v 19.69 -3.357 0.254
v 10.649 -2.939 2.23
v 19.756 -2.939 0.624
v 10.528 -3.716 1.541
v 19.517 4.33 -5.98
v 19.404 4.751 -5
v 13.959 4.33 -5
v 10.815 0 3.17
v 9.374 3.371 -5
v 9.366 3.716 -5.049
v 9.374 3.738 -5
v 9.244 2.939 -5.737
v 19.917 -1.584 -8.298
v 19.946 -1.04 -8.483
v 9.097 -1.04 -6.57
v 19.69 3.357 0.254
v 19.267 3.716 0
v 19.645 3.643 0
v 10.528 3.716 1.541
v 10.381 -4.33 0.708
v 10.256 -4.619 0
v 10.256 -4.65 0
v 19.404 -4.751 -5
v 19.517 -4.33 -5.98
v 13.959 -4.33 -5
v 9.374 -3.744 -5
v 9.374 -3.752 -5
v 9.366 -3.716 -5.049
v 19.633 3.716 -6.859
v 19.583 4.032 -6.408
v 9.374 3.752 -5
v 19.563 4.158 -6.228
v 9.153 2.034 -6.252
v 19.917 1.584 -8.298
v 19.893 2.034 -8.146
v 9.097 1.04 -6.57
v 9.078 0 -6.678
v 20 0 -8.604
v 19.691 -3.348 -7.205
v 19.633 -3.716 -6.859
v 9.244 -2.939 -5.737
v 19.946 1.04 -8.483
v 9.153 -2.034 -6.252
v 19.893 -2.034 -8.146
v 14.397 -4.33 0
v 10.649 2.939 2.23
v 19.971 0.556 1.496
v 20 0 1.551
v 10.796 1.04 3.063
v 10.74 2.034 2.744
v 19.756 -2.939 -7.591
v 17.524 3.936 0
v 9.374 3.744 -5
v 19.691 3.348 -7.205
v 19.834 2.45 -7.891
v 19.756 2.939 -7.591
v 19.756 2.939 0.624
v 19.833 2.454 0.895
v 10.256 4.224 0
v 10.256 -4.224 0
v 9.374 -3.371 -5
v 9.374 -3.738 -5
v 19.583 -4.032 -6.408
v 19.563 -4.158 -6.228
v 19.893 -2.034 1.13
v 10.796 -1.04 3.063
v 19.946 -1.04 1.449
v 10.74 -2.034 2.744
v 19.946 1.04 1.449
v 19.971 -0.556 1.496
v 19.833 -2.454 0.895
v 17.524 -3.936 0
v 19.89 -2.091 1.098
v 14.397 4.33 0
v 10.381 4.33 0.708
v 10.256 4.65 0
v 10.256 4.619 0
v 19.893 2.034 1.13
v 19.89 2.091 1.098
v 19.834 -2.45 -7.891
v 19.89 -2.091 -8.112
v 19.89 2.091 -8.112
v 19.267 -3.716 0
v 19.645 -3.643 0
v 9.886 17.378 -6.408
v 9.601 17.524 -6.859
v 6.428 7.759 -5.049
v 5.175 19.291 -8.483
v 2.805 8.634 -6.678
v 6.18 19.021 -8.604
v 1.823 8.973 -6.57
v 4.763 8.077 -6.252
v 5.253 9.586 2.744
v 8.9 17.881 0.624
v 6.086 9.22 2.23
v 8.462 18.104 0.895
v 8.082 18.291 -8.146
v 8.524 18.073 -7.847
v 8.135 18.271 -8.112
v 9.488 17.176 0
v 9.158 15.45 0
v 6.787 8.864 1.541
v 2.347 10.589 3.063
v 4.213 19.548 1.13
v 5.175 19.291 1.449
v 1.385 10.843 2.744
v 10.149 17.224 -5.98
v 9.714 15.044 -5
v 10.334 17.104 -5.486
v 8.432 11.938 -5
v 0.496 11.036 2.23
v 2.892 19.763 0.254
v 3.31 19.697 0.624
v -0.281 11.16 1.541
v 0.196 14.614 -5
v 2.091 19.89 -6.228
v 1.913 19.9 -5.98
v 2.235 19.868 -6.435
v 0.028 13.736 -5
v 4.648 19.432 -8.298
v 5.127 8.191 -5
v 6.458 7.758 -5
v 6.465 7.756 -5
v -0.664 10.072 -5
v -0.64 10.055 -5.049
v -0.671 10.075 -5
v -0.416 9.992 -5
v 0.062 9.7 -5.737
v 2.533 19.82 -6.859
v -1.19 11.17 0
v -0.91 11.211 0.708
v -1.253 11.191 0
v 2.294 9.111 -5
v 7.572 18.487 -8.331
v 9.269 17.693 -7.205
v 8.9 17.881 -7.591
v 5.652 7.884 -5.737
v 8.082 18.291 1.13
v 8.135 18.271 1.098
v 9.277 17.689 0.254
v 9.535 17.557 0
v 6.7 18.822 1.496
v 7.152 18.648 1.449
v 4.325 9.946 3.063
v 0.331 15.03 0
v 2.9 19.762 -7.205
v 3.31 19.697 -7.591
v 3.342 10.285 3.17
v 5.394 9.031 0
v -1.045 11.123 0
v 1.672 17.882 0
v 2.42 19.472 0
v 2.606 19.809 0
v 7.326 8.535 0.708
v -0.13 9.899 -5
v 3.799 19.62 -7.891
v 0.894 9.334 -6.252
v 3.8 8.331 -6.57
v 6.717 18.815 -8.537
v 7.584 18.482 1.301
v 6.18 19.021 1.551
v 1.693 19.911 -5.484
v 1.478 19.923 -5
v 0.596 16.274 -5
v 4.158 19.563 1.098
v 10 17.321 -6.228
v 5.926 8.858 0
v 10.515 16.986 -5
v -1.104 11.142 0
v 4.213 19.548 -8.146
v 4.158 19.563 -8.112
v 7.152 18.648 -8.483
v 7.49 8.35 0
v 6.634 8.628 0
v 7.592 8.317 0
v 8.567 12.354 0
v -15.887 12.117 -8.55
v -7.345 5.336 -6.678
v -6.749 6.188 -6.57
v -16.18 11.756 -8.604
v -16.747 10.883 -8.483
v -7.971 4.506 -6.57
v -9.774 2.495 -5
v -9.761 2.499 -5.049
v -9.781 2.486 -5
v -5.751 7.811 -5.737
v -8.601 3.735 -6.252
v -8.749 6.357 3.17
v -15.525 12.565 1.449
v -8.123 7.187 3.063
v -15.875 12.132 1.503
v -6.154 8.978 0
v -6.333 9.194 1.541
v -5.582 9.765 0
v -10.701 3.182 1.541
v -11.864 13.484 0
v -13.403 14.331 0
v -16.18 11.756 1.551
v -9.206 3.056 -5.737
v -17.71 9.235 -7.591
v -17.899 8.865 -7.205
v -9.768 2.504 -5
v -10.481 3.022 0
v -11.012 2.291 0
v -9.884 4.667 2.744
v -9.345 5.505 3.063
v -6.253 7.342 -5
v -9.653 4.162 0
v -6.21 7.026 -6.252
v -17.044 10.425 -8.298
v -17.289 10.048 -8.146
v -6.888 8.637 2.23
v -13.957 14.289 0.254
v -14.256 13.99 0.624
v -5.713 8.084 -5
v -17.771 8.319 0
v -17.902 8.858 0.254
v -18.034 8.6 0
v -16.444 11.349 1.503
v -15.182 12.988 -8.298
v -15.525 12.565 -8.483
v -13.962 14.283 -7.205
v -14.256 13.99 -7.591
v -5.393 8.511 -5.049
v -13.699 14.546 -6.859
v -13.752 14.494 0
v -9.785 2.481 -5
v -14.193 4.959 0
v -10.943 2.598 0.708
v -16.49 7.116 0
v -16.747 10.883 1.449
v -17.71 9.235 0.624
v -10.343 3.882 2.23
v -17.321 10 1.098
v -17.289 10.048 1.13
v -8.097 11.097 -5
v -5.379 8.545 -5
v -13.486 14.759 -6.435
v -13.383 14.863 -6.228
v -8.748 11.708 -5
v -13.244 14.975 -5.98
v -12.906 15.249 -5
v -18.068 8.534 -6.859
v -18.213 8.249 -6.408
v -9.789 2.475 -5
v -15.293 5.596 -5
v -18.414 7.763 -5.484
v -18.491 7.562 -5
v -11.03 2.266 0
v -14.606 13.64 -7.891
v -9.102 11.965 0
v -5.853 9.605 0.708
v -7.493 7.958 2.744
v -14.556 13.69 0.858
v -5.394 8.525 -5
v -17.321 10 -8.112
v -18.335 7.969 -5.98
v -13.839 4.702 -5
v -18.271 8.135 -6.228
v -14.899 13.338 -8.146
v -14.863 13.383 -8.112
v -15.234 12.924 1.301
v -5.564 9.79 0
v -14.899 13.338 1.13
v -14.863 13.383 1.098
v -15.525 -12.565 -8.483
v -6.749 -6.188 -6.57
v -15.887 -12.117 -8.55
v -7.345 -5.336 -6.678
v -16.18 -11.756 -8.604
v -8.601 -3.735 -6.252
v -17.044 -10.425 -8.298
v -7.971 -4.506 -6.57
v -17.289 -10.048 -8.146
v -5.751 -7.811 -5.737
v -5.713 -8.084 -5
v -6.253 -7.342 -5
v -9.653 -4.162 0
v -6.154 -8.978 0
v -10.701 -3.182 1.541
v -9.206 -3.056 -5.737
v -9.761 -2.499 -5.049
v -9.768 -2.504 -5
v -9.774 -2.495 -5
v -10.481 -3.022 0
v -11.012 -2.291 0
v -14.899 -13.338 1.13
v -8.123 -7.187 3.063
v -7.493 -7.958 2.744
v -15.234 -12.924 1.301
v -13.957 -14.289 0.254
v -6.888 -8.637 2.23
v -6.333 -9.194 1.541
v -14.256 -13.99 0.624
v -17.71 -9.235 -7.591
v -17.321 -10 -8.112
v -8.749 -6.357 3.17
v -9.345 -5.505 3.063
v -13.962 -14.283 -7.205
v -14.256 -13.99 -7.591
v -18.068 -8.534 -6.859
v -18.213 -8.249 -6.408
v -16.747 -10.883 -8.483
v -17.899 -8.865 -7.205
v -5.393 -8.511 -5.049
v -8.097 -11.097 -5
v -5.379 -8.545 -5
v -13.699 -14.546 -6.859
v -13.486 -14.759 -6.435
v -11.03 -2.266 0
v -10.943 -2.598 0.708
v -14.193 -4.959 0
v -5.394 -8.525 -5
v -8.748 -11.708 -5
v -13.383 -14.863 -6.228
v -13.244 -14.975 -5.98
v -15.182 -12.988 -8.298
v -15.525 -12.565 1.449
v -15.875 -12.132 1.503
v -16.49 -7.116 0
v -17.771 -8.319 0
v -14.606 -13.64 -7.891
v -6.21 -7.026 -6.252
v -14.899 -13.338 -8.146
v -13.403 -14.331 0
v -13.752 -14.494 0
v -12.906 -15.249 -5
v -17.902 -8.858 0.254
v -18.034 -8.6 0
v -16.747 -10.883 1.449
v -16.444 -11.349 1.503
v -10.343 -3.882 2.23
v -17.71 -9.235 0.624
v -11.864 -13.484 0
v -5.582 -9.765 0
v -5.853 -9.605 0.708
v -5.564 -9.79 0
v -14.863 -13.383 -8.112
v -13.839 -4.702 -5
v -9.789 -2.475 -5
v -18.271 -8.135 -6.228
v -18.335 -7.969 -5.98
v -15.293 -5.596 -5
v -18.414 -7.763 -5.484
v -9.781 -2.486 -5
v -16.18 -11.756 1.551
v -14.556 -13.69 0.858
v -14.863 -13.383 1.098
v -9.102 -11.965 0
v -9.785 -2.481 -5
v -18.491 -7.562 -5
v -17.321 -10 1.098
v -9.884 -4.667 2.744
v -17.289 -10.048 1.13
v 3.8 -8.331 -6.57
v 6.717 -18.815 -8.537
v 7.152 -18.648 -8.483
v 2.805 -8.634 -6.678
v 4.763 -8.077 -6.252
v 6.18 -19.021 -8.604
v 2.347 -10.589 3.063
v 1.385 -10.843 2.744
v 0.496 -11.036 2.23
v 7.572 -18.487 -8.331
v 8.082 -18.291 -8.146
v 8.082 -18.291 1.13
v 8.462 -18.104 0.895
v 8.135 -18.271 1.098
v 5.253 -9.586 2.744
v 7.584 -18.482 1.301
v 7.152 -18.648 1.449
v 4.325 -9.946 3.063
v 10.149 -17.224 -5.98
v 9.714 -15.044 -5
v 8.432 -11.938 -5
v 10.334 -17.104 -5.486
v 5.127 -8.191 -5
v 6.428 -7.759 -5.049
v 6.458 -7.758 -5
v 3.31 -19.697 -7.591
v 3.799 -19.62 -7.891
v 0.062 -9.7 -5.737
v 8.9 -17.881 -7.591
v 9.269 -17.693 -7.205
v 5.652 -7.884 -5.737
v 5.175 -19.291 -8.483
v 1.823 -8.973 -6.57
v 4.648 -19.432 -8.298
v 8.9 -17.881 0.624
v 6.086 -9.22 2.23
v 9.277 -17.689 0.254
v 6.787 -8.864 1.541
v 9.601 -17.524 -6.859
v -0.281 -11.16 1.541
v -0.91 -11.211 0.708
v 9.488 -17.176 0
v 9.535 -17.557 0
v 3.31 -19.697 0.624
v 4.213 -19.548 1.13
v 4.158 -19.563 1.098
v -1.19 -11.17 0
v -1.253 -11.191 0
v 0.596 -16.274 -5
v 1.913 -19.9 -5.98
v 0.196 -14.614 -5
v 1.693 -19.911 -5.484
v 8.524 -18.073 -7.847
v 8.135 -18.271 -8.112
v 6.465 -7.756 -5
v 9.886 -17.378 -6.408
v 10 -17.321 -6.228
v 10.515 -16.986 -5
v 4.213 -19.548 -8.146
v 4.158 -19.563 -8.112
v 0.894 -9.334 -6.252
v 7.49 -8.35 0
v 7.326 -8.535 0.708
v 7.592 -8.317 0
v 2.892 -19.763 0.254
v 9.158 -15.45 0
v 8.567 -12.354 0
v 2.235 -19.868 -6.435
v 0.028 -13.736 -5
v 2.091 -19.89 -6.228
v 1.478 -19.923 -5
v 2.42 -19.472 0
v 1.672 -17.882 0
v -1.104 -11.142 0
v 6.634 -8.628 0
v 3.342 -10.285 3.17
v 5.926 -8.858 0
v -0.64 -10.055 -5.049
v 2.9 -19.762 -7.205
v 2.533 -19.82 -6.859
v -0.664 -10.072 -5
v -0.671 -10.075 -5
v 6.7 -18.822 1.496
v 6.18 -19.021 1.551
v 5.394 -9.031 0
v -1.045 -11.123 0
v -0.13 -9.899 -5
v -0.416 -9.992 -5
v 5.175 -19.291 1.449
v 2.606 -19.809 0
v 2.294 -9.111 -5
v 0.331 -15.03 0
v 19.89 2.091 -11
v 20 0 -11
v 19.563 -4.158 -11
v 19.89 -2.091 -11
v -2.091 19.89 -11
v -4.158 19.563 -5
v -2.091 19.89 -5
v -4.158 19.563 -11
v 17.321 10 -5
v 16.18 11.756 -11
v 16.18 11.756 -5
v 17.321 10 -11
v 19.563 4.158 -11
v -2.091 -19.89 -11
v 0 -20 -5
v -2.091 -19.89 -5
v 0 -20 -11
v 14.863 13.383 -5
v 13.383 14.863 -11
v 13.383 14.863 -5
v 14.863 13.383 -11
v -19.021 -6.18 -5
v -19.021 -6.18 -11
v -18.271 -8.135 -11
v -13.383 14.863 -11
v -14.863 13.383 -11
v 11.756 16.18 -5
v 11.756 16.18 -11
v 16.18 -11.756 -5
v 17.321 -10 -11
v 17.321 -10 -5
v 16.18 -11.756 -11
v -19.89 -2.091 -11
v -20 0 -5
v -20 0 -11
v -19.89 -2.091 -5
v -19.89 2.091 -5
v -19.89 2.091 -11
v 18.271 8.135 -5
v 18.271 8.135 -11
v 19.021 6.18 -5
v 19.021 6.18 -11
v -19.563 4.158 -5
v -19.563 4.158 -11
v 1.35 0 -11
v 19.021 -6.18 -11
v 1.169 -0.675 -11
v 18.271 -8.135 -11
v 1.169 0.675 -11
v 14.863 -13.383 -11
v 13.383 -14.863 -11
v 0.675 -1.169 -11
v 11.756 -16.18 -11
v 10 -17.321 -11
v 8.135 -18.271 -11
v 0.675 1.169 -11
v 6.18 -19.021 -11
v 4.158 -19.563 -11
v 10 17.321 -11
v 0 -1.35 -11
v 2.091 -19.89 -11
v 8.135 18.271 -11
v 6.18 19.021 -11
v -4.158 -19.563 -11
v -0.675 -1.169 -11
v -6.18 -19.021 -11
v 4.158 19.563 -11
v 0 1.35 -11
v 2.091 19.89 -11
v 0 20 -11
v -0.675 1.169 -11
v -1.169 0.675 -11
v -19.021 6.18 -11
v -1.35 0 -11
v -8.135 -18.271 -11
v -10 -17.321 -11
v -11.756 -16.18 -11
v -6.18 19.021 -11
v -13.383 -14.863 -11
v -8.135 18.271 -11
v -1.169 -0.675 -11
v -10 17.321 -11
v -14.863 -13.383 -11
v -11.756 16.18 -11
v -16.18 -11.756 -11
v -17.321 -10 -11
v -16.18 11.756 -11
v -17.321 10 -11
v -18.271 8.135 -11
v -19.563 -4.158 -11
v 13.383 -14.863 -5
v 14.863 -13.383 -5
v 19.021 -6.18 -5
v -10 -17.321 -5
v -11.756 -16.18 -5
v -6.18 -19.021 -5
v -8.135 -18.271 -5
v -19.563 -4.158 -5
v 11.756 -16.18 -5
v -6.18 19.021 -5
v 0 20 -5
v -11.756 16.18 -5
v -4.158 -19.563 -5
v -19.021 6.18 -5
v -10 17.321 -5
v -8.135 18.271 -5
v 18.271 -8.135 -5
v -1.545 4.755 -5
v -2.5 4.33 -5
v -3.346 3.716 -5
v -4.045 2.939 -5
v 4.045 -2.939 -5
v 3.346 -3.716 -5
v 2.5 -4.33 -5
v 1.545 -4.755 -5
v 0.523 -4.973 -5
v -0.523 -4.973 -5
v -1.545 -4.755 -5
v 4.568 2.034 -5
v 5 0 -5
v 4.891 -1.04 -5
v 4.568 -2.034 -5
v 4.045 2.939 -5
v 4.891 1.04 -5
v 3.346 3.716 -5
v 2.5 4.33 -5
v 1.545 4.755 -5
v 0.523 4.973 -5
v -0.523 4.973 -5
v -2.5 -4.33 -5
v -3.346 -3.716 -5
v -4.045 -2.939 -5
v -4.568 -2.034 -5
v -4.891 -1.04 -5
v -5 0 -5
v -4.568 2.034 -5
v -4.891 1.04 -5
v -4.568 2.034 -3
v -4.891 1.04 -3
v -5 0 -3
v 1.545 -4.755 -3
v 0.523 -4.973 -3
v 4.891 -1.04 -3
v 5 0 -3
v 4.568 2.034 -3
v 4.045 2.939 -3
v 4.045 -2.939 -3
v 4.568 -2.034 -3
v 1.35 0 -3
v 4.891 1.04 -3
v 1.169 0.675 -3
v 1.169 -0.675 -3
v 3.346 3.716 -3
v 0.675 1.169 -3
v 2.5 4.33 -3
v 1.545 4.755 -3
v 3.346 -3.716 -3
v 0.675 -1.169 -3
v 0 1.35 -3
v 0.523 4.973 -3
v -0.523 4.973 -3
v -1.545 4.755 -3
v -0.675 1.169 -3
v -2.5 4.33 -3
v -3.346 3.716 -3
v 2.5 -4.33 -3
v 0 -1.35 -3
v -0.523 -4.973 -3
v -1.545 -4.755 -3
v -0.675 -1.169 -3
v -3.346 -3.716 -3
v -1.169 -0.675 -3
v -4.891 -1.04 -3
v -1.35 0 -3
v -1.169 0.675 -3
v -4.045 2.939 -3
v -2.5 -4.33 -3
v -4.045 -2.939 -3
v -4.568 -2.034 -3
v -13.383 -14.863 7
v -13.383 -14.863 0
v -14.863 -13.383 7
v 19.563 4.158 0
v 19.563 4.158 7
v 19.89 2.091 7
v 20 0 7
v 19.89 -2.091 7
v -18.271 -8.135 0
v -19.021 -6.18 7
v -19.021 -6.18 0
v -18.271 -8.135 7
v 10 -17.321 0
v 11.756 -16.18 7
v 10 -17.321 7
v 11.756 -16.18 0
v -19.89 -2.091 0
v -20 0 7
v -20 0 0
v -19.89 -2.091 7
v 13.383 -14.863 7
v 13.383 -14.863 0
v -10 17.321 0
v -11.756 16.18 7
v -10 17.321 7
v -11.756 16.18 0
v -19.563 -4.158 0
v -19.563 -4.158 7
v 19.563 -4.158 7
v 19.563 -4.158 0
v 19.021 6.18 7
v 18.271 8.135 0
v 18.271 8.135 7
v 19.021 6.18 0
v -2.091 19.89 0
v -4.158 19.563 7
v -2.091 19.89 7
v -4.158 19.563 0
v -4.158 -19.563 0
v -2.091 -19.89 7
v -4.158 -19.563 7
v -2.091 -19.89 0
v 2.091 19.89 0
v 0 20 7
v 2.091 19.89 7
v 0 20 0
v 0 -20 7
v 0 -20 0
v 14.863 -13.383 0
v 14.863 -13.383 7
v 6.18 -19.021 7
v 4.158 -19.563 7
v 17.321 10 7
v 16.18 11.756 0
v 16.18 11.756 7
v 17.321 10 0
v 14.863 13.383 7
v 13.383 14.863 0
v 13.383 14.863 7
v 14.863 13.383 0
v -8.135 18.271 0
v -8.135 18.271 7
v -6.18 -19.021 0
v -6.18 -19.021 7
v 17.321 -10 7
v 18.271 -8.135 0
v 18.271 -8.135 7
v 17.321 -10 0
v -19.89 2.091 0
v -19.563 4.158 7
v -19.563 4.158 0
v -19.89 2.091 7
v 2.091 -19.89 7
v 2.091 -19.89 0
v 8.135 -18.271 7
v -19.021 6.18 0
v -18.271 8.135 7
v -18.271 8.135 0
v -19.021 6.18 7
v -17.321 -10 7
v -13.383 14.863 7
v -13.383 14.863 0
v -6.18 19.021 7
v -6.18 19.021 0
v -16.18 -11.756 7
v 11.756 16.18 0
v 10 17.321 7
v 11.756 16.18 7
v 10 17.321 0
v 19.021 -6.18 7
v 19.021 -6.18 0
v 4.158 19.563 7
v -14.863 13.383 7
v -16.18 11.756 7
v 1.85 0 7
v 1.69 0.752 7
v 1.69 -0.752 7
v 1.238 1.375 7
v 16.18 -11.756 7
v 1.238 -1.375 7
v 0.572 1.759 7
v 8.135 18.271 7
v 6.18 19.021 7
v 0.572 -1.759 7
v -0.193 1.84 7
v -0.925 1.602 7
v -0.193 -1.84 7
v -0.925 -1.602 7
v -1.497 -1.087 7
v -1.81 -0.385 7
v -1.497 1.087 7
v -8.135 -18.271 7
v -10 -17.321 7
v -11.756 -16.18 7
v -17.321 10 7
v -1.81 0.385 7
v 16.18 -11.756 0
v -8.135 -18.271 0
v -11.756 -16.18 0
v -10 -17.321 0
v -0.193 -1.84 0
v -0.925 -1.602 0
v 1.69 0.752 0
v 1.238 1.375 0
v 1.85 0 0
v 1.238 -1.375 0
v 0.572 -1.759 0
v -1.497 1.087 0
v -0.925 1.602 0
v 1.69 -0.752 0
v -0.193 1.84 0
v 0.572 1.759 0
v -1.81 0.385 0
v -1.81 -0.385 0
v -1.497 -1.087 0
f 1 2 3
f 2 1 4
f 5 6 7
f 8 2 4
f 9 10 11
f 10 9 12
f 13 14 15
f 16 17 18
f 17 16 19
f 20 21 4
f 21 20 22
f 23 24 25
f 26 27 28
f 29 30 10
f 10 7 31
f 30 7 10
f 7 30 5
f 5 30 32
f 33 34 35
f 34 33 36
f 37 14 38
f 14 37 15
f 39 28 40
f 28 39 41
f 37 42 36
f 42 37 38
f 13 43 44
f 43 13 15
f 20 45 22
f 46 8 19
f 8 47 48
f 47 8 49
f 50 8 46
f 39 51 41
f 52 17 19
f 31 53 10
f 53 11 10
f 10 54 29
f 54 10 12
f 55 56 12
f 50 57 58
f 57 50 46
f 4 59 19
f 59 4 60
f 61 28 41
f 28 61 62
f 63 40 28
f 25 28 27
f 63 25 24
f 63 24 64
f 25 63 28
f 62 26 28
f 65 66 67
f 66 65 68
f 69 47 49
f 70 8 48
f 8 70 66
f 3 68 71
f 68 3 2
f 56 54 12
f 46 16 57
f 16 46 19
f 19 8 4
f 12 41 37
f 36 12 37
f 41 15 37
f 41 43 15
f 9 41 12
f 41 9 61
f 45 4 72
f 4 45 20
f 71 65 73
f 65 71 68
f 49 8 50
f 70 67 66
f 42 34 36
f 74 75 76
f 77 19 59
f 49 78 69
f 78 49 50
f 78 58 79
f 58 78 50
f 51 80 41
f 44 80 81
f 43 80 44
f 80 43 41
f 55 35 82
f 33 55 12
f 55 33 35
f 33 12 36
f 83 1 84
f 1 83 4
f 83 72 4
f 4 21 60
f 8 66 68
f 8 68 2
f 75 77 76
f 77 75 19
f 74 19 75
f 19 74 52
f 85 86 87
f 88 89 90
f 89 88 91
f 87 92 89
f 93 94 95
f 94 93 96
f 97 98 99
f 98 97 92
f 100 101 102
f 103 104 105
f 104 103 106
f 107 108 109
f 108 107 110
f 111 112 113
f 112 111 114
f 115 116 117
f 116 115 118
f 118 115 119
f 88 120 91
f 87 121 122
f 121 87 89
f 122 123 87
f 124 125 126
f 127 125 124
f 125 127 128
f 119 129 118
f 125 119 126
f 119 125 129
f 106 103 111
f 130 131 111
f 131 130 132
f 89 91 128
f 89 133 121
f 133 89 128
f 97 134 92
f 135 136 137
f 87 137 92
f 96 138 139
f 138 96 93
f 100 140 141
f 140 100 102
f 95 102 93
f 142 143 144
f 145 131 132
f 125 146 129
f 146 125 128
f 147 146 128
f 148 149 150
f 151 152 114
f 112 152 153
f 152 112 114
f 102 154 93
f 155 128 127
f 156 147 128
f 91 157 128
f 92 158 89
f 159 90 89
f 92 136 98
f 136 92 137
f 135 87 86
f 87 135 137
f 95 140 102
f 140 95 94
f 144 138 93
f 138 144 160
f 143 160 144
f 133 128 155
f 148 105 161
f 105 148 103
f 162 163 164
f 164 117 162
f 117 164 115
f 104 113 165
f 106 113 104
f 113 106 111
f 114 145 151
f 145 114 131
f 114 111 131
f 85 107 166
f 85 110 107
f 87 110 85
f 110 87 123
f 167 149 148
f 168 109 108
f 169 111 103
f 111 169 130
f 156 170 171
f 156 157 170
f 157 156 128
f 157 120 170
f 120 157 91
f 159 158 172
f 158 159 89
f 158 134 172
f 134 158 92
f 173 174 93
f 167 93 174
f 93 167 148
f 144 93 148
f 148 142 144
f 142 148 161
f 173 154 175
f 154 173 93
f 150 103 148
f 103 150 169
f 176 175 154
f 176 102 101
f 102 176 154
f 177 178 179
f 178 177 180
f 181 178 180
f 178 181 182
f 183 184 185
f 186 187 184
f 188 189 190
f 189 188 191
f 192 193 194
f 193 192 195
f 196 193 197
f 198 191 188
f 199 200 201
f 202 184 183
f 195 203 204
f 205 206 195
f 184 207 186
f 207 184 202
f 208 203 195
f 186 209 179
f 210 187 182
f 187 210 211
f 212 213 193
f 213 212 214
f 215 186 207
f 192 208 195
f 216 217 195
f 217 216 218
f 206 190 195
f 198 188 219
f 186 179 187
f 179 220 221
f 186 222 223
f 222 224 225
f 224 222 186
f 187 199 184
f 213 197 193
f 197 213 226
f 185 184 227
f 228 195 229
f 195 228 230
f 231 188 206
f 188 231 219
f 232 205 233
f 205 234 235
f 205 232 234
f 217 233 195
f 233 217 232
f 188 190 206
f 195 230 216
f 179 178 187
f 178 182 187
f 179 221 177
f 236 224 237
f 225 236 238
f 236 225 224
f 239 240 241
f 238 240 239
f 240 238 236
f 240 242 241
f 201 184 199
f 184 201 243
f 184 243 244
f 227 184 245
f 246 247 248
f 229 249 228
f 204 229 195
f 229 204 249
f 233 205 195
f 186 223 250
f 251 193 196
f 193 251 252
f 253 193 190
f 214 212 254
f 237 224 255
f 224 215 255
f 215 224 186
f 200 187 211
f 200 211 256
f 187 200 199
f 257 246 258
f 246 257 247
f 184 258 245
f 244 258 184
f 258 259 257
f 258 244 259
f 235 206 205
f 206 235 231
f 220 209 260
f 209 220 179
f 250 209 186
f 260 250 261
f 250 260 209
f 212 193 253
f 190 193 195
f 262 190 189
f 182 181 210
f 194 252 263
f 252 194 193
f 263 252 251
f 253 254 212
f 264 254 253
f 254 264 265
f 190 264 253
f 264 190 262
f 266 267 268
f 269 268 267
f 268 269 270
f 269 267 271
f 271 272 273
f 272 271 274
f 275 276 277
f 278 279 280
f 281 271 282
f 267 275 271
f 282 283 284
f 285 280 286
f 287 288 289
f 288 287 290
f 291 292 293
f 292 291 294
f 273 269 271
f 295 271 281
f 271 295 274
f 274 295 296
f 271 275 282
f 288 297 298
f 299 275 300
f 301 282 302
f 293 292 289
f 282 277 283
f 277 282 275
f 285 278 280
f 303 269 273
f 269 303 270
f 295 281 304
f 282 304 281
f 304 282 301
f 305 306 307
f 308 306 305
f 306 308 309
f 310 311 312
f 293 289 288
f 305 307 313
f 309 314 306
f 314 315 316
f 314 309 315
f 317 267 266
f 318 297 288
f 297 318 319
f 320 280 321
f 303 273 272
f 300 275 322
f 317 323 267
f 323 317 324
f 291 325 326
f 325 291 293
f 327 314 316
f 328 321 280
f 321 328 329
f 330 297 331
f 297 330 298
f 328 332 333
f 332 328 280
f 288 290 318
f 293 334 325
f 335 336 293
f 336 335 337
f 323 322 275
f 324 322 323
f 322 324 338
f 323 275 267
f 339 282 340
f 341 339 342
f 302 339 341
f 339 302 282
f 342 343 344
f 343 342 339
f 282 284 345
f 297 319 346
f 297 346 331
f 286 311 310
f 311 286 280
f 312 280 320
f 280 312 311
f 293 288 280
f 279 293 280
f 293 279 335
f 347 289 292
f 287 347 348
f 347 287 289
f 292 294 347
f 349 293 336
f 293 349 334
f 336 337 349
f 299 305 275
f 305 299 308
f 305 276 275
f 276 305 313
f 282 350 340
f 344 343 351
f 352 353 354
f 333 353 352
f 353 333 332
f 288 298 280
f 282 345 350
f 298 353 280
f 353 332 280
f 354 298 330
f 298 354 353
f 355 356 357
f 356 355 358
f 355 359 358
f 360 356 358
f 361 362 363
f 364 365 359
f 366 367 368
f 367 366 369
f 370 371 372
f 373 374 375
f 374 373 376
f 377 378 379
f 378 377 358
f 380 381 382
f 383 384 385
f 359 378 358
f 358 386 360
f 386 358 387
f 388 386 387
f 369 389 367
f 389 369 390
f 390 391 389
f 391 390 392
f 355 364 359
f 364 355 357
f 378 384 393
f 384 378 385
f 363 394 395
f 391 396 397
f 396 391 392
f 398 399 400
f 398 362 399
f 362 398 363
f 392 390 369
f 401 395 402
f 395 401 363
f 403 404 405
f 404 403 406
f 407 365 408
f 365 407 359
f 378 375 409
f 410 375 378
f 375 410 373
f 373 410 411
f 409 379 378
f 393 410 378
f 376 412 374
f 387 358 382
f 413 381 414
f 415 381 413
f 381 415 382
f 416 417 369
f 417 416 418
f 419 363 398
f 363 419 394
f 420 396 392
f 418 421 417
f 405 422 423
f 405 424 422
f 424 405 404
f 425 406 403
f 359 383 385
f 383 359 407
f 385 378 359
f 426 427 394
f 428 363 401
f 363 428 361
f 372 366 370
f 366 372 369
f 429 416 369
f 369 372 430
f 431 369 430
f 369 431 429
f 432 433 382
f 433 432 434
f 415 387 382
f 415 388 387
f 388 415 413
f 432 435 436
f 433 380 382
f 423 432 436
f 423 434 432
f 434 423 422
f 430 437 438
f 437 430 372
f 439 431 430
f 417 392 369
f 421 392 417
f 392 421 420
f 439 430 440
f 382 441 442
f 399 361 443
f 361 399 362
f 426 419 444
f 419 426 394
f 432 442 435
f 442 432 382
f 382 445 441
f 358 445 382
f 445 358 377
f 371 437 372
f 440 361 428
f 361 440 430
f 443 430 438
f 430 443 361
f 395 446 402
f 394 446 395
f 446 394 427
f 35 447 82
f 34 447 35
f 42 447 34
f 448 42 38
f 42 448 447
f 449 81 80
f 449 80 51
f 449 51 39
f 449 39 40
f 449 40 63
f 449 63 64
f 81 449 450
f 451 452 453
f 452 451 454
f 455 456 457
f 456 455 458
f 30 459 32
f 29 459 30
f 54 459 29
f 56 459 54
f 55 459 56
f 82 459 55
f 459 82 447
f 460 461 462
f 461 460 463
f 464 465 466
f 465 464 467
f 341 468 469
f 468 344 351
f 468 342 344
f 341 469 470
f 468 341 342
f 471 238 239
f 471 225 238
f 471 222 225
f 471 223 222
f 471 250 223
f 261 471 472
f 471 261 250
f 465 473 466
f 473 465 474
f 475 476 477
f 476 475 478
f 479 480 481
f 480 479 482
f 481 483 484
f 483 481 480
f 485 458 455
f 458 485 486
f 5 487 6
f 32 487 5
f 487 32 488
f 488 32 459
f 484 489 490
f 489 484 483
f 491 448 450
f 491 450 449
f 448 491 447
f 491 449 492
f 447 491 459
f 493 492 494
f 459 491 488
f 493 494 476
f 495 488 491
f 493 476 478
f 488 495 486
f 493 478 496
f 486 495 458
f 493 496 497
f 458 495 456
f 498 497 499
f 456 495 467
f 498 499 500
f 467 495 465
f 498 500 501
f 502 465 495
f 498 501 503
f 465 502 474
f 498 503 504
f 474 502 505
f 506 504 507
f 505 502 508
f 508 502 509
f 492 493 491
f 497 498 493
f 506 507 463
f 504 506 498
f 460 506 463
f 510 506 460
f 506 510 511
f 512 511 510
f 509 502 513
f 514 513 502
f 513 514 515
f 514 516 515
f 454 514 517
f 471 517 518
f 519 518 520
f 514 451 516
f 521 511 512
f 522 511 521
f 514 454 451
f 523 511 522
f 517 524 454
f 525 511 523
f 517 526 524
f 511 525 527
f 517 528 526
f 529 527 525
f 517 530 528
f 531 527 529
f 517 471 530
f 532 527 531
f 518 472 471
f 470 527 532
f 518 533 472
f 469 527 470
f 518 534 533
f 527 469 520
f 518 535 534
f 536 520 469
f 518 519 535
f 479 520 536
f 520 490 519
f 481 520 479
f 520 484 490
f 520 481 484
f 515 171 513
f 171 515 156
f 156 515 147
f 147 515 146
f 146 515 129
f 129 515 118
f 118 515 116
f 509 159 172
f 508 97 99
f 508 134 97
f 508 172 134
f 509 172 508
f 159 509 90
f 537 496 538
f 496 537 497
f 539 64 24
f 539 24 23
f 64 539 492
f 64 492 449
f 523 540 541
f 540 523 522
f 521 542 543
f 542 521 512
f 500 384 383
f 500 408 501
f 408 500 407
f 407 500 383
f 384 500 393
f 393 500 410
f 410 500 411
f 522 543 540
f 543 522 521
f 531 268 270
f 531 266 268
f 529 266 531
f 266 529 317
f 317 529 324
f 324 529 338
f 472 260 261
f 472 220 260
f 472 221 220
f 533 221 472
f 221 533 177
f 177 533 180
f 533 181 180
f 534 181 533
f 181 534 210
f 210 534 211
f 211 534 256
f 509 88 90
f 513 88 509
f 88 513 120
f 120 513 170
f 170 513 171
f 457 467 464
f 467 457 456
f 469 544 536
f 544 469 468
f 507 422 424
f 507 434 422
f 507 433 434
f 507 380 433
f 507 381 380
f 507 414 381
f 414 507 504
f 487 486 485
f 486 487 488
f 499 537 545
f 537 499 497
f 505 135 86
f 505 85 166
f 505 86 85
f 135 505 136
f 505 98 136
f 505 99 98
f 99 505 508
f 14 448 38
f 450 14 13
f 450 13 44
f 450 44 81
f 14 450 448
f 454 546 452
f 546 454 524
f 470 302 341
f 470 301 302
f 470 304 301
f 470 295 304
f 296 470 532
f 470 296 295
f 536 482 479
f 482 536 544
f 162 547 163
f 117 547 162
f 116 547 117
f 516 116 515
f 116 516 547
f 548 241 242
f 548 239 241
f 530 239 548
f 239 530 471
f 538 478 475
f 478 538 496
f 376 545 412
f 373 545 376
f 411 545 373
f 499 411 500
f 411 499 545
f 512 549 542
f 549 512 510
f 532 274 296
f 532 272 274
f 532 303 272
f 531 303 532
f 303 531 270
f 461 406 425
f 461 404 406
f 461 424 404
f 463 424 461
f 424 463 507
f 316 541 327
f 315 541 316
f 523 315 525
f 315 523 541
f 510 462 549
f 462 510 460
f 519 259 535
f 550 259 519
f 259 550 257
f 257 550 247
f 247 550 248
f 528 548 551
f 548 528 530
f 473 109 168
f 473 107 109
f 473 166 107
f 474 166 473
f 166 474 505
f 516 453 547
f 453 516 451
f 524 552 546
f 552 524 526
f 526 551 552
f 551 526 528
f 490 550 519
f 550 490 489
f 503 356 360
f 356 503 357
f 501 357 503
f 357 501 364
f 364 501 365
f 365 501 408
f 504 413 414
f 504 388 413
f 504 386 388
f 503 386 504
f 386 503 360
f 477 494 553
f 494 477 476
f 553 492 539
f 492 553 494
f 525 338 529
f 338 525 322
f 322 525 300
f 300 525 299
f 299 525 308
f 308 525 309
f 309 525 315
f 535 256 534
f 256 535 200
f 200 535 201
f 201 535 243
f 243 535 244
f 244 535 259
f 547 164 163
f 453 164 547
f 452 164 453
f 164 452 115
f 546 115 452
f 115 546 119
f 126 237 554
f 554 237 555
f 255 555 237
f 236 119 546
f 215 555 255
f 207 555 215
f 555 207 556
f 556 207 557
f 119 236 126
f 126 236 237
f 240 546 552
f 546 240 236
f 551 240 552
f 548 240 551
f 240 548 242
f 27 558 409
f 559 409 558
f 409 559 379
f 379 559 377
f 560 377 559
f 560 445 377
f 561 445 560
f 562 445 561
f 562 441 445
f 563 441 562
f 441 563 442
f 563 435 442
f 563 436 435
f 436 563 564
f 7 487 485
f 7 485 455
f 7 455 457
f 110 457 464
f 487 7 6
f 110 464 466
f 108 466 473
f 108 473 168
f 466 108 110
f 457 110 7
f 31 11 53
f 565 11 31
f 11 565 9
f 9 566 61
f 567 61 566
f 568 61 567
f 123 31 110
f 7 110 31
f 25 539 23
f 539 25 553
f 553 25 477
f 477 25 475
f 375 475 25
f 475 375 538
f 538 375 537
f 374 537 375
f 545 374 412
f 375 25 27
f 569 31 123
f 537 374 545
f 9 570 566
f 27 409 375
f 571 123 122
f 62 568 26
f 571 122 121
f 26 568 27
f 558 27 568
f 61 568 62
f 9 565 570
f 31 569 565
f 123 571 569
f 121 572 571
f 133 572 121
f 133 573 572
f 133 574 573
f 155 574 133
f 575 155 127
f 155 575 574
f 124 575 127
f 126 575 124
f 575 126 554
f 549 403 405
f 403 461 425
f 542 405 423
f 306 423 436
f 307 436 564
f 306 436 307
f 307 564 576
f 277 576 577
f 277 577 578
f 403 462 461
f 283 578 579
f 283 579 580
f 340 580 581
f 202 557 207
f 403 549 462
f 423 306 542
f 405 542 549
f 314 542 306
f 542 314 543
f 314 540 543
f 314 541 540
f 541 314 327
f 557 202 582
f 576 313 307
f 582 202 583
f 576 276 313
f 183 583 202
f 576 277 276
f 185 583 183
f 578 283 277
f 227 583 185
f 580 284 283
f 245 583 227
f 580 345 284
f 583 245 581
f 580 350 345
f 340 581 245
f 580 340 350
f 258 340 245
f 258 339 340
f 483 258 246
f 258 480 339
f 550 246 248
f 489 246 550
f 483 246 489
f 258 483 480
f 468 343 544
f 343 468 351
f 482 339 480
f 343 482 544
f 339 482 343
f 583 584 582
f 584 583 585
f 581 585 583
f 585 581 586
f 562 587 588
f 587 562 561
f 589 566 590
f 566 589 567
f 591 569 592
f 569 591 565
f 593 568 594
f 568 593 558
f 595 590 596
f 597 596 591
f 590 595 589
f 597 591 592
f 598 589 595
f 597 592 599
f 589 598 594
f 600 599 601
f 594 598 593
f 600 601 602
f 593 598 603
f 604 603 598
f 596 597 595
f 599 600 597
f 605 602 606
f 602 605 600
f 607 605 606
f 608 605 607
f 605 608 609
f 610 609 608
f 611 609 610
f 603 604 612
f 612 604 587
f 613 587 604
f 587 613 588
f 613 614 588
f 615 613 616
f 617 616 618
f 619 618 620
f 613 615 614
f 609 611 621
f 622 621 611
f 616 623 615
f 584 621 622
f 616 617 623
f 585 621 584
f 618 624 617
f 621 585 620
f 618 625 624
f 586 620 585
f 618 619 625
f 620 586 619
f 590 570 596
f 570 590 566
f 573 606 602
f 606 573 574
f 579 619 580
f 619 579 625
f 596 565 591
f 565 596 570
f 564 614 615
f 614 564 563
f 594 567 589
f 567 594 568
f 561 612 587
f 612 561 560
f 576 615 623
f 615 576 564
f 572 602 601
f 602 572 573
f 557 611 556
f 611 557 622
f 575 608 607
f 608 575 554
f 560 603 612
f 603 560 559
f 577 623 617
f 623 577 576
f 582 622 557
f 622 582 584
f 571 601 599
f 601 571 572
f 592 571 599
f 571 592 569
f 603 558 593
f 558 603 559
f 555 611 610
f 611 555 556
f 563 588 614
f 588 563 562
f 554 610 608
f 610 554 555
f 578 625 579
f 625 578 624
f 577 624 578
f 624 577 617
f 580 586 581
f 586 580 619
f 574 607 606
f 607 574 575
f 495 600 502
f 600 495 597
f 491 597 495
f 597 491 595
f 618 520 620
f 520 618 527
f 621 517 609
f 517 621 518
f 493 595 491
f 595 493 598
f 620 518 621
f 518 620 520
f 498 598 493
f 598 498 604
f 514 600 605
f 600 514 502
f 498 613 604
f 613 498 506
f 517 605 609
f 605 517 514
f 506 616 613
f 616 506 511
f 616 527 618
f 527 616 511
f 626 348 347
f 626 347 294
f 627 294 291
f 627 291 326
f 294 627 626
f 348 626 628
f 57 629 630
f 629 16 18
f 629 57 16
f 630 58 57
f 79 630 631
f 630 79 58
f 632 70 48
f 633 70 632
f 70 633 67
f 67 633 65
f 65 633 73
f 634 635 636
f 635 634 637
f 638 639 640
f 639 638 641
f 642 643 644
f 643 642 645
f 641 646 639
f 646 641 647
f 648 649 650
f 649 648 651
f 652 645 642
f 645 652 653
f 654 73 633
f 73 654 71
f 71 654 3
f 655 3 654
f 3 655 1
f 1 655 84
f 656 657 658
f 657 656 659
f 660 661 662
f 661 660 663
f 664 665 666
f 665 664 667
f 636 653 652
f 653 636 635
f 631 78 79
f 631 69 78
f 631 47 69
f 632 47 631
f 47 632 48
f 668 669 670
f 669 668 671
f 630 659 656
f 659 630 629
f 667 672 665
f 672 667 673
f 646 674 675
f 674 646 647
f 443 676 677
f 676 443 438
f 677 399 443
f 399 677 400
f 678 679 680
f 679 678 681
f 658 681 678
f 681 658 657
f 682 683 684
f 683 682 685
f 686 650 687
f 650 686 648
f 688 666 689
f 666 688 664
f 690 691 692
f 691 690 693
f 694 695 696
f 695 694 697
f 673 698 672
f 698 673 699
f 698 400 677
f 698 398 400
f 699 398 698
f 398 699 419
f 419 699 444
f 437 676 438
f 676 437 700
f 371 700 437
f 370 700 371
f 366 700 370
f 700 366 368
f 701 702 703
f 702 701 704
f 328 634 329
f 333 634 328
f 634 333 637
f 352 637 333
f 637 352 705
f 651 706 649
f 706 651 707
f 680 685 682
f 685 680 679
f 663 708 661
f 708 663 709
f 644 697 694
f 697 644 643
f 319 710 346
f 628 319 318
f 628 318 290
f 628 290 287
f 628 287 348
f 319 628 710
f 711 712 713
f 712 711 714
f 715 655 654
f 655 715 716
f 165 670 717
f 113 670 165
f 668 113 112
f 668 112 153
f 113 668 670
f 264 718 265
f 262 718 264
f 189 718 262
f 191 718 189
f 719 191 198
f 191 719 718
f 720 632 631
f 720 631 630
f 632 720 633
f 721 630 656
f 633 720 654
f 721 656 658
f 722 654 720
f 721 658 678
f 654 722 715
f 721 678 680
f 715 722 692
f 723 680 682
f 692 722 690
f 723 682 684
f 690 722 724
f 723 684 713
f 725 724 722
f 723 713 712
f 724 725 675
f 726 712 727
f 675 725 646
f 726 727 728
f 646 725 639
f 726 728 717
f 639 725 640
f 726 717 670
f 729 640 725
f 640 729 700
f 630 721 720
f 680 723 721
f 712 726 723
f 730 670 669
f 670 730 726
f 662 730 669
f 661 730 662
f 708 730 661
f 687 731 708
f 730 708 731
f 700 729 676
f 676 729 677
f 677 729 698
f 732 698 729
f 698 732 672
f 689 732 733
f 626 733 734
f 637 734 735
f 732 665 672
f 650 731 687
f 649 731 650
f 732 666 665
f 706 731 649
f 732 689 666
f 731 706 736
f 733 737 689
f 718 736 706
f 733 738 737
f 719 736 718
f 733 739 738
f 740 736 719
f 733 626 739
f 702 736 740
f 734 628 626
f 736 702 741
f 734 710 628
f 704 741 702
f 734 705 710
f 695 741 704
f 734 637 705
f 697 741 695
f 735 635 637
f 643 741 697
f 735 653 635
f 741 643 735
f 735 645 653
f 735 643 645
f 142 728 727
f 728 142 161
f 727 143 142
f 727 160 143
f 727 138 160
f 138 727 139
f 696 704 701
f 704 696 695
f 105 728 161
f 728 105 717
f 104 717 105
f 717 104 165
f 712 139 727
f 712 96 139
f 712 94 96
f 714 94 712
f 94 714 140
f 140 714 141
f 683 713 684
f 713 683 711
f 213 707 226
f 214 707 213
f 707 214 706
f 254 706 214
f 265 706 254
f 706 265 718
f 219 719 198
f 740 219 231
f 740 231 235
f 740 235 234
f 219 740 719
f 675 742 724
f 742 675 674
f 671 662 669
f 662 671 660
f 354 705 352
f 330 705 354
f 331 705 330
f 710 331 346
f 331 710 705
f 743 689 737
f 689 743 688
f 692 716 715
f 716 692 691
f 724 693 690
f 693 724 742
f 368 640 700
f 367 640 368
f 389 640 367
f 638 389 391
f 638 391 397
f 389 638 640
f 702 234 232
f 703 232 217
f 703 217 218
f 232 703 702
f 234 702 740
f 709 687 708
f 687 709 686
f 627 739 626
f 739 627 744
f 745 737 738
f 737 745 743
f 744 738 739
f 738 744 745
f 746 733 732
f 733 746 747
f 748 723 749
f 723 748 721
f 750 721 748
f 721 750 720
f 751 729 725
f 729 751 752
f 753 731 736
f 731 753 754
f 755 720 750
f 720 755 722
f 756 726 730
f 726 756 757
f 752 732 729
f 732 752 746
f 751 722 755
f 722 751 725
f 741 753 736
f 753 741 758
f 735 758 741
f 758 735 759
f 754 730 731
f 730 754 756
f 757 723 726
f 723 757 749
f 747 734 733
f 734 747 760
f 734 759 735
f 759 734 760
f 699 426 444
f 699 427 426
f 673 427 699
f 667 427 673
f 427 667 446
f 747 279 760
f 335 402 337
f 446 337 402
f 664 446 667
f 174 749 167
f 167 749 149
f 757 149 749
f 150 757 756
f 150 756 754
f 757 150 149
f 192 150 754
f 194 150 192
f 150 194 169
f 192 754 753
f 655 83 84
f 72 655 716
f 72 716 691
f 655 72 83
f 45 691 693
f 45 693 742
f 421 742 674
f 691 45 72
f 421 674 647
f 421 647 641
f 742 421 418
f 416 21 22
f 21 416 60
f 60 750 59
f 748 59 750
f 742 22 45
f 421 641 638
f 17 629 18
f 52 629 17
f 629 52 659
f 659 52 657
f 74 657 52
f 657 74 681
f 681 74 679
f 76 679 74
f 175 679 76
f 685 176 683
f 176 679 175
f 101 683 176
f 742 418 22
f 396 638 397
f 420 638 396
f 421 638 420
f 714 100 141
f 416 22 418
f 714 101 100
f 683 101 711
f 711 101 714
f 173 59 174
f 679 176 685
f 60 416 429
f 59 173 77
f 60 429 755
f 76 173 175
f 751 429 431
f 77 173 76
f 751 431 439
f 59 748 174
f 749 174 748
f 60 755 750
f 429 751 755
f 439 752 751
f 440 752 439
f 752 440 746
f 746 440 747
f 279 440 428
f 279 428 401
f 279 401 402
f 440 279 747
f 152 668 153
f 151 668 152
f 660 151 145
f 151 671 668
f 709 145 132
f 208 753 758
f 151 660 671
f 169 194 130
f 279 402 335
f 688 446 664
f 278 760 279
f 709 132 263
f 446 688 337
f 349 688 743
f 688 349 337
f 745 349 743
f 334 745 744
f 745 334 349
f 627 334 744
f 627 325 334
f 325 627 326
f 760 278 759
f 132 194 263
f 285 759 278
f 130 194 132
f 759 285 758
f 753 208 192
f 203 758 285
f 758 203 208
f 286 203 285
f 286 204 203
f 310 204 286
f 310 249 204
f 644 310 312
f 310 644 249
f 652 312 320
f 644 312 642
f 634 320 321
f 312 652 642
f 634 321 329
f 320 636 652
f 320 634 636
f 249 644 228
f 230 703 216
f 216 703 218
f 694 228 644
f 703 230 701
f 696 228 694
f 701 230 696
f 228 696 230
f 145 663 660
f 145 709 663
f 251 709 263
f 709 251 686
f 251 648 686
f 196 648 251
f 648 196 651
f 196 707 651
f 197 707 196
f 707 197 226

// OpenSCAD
angle=10;
offset=-2;
$fn=30;

difference(){
translate([0,0,offset])
cylinder(d=40,h=18,$fn=60,center=true);
cylinder(d=3.7,h=60,$fn=15,center=true);
for(i=[0:72:330]){
rotate([0,0,i])
rotate([0,angle,0])translate([20.1,0,0])
rotate([0,90,0])cylinder(d=10,h=20,center=true);
}
translate([0,0,-5])cylinder(d=50,h=20);
}
difference(){
translate([0,0,-11])cylinder(d=10,h=8,$fn=30);
cylinder(d=2.7,h=100,$fn=12,center=true);
}

difference(){
translate([0,0,offset])
cylinder(d=40,h=18,$fn=60,center=true);
cylinder(d=3.7,h=60,$fn=15,center=true);
for(i=[0:72:330]){
rotate([0,0,i])
rotate([0,angle,0])translate([20.1,0,0])
rotate([0,90,0])cylinder(d=10,h=20,center=true);
}
translate([0,0,-30])cylinder(d=50,h=30);
}

%rotate([0,angle,0])translate([20.1,0,0])
rotate([0,90,0])cylinder(d=10,h=20,center=true);
